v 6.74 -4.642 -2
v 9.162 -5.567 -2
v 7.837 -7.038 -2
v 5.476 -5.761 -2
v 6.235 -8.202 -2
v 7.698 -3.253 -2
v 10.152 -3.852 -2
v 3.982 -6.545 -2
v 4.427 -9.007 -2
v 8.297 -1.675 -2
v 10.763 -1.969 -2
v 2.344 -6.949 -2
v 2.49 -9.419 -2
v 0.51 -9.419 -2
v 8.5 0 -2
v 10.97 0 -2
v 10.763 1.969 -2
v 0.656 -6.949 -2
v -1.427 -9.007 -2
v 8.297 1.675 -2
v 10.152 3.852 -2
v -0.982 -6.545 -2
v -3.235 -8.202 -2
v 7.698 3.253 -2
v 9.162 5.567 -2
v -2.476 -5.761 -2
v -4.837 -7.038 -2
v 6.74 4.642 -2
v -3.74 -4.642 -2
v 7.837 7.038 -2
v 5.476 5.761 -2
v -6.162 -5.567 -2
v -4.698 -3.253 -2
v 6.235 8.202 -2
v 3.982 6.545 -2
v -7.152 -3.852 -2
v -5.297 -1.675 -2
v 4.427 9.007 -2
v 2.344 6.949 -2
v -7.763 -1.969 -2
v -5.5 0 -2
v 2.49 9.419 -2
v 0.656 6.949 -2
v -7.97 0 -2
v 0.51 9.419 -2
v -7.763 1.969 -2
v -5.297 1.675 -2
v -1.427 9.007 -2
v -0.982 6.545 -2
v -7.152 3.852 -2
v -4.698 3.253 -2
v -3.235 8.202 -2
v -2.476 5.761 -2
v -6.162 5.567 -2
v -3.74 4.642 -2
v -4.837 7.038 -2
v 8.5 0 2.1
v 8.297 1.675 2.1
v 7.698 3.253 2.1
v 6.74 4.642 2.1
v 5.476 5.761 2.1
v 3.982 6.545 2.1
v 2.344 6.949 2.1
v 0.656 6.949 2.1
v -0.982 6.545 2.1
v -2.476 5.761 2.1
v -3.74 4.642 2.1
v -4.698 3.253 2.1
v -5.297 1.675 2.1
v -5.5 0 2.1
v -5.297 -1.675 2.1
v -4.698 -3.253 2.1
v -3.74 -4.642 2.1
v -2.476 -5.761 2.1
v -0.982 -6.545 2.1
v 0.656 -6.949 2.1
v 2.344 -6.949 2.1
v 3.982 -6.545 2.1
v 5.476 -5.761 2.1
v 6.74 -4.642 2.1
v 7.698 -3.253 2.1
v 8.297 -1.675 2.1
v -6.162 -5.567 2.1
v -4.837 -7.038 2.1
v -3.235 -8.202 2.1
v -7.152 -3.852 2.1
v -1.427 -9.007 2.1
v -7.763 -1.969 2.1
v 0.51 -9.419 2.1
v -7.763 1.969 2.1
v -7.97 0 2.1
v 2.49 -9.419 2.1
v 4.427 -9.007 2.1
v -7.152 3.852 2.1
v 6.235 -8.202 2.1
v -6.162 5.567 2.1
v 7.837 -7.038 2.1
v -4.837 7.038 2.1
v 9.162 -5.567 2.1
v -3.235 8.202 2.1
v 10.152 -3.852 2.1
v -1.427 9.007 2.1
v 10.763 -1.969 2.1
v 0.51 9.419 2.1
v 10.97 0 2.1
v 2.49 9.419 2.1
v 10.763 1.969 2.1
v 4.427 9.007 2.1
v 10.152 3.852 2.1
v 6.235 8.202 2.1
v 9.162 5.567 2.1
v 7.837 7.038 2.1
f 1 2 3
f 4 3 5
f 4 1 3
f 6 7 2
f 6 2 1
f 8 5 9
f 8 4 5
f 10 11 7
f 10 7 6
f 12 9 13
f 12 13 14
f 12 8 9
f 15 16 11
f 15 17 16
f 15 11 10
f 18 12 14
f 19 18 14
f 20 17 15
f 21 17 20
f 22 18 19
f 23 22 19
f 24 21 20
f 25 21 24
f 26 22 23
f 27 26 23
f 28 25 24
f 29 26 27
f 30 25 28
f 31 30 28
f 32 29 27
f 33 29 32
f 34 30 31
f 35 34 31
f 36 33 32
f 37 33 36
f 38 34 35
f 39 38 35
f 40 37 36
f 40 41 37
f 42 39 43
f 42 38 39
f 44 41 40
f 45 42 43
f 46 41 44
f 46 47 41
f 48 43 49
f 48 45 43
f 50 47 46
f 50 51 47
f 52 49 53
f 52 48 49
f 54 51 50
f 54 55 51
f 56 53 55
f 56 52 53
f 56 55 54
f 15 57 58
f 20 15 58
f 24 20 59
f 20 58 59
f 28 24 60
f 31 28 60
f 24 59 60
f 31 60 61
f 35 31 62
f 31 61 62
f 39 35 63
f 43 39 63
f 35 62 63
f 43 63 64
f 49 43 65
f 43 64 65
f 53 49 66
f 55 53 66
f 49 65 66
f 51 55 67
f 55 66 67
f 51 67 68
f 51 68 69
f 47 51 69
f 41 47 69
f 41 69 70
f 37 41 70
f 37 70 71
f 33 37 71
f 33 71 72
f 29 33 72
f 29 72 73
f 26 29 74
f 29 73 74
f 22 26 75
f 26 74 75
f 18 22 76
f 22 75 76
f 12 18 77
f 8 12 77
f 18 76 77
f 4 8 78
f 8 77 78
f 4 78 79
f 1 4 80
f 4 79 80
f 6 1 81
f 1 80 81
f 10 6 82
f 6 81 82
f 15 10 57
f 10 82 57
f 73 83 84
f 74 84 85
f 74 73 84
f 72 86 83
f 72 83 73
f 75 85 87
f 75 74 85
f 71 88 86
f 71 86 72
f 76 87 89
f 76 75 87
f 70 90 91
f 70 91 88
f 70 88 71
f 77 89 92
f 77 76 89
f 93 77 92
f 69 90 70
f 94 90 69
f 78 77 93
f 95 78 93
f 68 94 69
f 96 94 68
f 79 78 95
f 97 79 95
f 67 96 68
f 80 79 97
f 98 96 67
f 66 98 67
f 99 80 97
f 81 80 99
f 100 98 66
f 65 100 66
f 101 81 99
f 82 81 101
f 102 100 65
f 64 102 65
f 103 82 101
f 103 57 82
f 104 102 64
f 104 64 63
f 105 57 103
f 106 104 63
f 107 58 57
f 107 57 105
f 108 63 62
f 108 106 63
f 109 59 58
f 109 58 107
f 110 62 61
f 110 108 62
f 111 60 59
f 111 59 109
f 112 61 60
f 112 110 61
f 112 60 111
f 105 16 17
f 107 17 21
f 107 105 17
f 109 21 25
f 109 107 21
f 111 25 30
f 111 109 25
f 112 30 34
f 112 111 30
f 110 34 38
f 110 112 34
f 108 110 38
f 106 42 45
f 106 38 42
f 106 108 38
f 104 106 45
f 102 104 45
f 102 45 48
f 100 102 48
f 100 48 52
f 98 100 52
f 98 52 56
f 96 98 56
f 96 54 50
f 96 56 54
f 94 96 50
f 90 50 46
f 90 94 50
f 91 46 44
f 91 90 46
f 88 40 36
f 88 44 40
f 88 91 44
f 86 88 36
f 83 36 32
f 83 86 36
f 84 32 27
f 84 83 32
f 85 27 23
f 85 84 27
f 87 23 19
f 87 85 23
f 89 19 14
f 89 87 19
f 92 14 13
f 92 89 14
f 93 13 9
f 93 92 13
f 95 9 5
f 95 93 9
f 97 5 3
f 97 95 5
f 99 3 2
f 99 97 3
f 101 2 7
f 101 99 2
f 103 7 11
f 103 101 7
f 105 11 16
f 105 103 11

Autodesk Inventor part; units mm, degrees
ref_plane "YZ Plane" through (0, 0, 0) normal (1, 0, 0) x (0, 1, 0)
ref_plane "XZ Plane" through (0, 0, 0) normal (0, 1, 0) x (-1, 0, 0)
ref_plane "XY Plane" through (0, 0, 0) normal (0, 0, 1) x (1, 0, 0)
sketch "Sketch1" plane through (0, 0, 0) normal (0, 0, 1) x (1, 0, 0)
  circle A0 centre (1.5, 0) radius 7 projected
  circle A1 centre (1.5, 0) radius 7 projected
  circle A2 centre (1.5, 0) radius 1.5 projected
  circle A3 centre (1.5, 0) radius 1 projected
  line L0 (16.2929, 8.3594) -> (-3.7046, 8.2678)
  line L1 (1.5, 0) -> (1.462, 8.2914)
  line L2 (1.462, 8.2914) -> (1.4574, 9.2914)
  line L3 (-7.6528, 0.7576) -> (-7.6612, 1.3735) projected
  ellipse E0 centre (-7.4913, -0.0469) end of major axis (-7.487, -1.0469) minor radius 0.015 projected
  ellipse E1 centre (-7.4913, -0.0469) end of major axis (-7.487, -1.0469) minor radius 0.015 projected
  ellipse E2 centre (-7.5641, 0.5606) end of major axis (-7.5648, 0.7606) minor radius 0.0029 (-7.5669, 0.6786) -> (-7.5649, 0.3868) ccw projected
  ellipse E3 centre (-7.607, -0.1095) end of major axis (-7.6033, -1.1095) minor radius 0.0145 projected
  ellipse E4 centre (-7.607, -0.1095) end of major axis (-7.6033, -1.1095) minor radius 0.0145 projected
  ellipse E5 centre (-7.4913, -0.0469) end of major axis (-7.487, -1.0469) minor radius 0.015 projected
  ellipse E6 centre (-7.4369, -0.2282) end of major axis (-7.4378, -0.0282) minor radius 0.003 (-7.4348, -0.4079) -> (-7.4361, -0.0582) ccw projected
  ellipse E7 centre (-7.4913, -0.0469) end of major axis (-7.487, -1.0469) minor radius 0.015 projected
  ellipse E8 centre (-7.4913, -0.0469) end of major axis (-7.487, -1.0469) minor radius 0.015 projected
  ellipse E9 centre (-7.5547, -1.7062) end of major axis (-7.5554, -1.5062) minor radius 0.0029 (-7.5538, -1.906) -> (-7.5527, -1.5926) ccw projected
  ellipse E10 centre (-7.6485, -1.6199) end of major axis (-7.6492, -1.4199) minor radius 0.0029 (-7.6512, -1.502) -> (-7.6479, -1.8195) ccw projected
  line L4 (-7.6369, -1.8711) -> (-7.6479, -1.8195) projected
  ellipse E11 centre (-7.6364, -2.0707) end of major axis (-7.6371, -1.8707) minor radius 0.0029 (-7.6334, -2.1069) -> (-7.6369, -1.8711) ccw projected
  line L5 (-7.6327, -2.8428) -> (-7.6334, -2.1069) projected
  ellipse E12 centre (-7.6297, -2.879) end of major axis (-7.6304, -2.679) minor radius 0.0029 (-7.6327, -2.8428) -> (-7.6279, -3.0648) ccw projected
  line L6 (-7.6189, -2.7874) -> (-7.6279, -3.0648) projected
  ellipse E13 centre (-7.6171, -2.9732) end of major axis (-7.6179, -2.7732) minor radius 0.0029 (-7.6145, -2.9205) -> (-7.6189, -2.7874) ccw projected
  line L7 (-7.609, -3.6423) -> (-7.6145, -2.9205) projected
  ellipse E14 centre (-7.6064, -3.5896) end of major axis (-7.6072, -3.3896) minor radius 0.0029 (-7.609, -3.6423) -> (-7.6038, -3.7248) ccw projected
  line L8 (-7.5985, -3.1734) -> (-7.6038, -3.7248) projected
  ellipse E15 centre (-7.5958, -3.3085) end of major axis (-7.5966, -3.1086) minor radius 0.0029 (-7.5941, -3.1773) -> (-7.5985, -3.1734) ccw projected
  line L9 (-7.585, -3.7421) -> (-7.5941, -3.1773) projected
  ellipse E16 centre (-7.5833, -3.6109) end of major axis (-7.584, -3.4109) minor radius 0.0029 (-7.585, -3.7421) -> (-7.5803, -3.6688) ccw projected
  line L10 (-7.5798, -2.9524) -> (-7.5803, -3.6688) projected
  ellipse E17 centre (-7.5768, -3.0103) end of major axis (-7.5775, -2.8103) minor radius 0.0029 (-7.5763, -2.8266) -> (-7.5798, -2.9524) ccw projected
  line L11 (-7.5652, -3.1224) -> (-7.5763, -2.8266) projected
  ellipse E18 centre (-7.5648, -2.9387) end of major axis (-7.5655, -2.7387) minor radius 0.0029 (-7.5652, -3.1224) -> (-7.562, -2.9078) ccw projected
  line L12 (-7.5664, -2.1685) -> (-7.562, -2.9078) projected
  ellipse E19 centre (-7.5637, -2.1375) end of major axis (-7.5644, -1.9375) minor radius 0.0029 (-7.5645, -1.9377) -> (-7.5664, -2.1685) ccw projected
  line L13 (-7.5538, -1.906) -> (-7.5645, -1.9377) projected
  ellipse E20 centre (-7.5547, -1.7062) end of major axis (-7.5554, -1.5062) minor radius 0.0029 (-7.5538, -1.906) -> (-7.5527, -1.5926) ccw projected
  line L14 (-7.5611, -0.9767) -> (-7.5527, -1.5926) projected
  ellipse E21 centre (-7.5591, -0.8631) end of major axis (-7.5599, -0.6631) minor radius 0.0029 (-7.5612, -0.6867) -> (-7.5611, -0.9767) ccw projected
  line L15 (-7.5529, -0.3338) -> (-7.5612, -0.6867) projected
  ellipse E22 centre (-7.5549, -0.1574) end of major axis (-7.5556, 0.0426) minor radius 0.0029 (-7.5529, -0.3338) -> (-7.5541, 0.0164) ccw projected
  line L16 (-7.5649, 0.3868) -> (-7.5541, 0.0164) projected
  ellipse E23 centre (-7.5641, 0.5606) end of major axis (-7.5648, 0.7606) minor radius 0.0029 (-7.5669, 0.6786) -> (-7.5649, 0.3868) ccw projected
  line L17 (-7.5627, 1.2829) -> (-7.5669, 0.6786) projected
  ellipse E24 centre (-7.5655, 1.4008) end of major axis (-7.5662, 1.6008) minor radius 0.0029 (-7.5627, 1.2829) -> (-7.566, 1.6004) ccw projected
  line L18 (-7.577, 1.652) -> (-7.566, 1.6004) projected
  ellipse E25 centre (-7.5775, 1.8516) end of major axis (-7.5783, 2.0516) minor radius 0.0029 (-7.5805, 1.8878) -> (-7.577, 1.652) ccw projected
  line L19 (-7.5812, 2.6237) -> (-7.5805, 1.8878) projected
  ellipse E26 centre (-7.5842, 2.66) end of major axis (-7.585, 2.86) minor radius 0.0029 (-7.5812, 2.6237) -> (-7.586, 2.8457) ccw projected
  line L20 (-7.595, 2.5683) -> (-7.586, 2.8457) projected
  ellipse E27 centre (-7.5968, 2.7541) end of major axis (-7.5975, 2.9541) minor radius 0.0029 (-7.5994, 2.7014) -> (-7.595, 2.5683) ccw projected
  line L21 (-7.6049, 3.4233) -> (-7.5994, 2.7014) projected
  ellipse E28 centre (-7.6075, 3.3705) end of major axis (-7.6082, 3.5705) minor radius 0.0029 (-7.6049, 3.4233) -> (-7.6101, 3.5057) ccw projected
  line L22 (-7.6154, 2.9543) -> (-7.6101, 3.5057) projected
  ellipse E29 centre (-7.6181, 3.0895) end of major axis (-7.6188, 3.2895) minor radius 0.0029 (-7.6198, 2.9582) -> (-7.6154, 2.9543) ccw projected
  line L23 (-7.629, 3.523) -> (-7.6198, 2.9582) projected
  ellipse E30 centre (-7.6307, 3.3918) end of major axis (-7.6314, 3.5918) minor radius 0.0029 (-7.629, 3.523) -> (-7.6337, 3.4497) ccw projected
  line L24 (-7.6342, 2.7334) -> (-7.6337, 3.4497) projected
  ellipse E31 centre (-7.6372, 2.7912) end of major axis (-7.6379, 2.9912) minor radius 0.0029 (-7.6376, 2.6075) -> (-7.6342, 2.7334) ccw projected
  line L25 (-7.6487, 2.9034) -> (-7.6376, 2.6075) projected
  ellipse E32 centre (-7.6492, 2.7196) end of major axis (-7.6499, 2.9196) minor radius 0.0029 (-7.6487, 2.9034) -> (-7.6519, 2.6887) ccw projected
  line L26 (-7.6475, 1.9494) -> (-7.6519, 2.6887) projected
  ellipse E33 centre (-7.6503, 1.9184) end of major axis (-7.651, 2.1184) minor radius 0.0029 (-7.6494, 1.7186) -> (-7.6475, 1.9494) ccw projected
  line L27 (-7.6601, 1.6869) -> (-7.6494, 1.7186) projected
  ellipse E34 centre (-7.6593, 1.4871) end of major axis (-7.66, 1.6871) minor radius 0.0029 (-7.6601, 1.6869) -> (-7.6612, 1.3735) ccw projected
  line L28 (-7.6528, 0.7576) -> (-7.6612, 1.3735) projected
  ellipse E35 centre (-7.6548, 0.644) end of major axis (-7.6555, 0.844) minor radius 0.0029 (-7.6528, 0.4676) -> (-7.6528, 0.7576) ccw projected
  line L29 (-7.661, 0.1147) -> (-7.6528, 0.4676) projected
  ellipse E36 centre (-7.659, -0.0617) end of major axis (-7.6598, 0.1383) minor radius 0.0029 (-7.661, 0.1147) -> (-7.6598, -0.2354) ccw projected
  line L30 (-7.649, -0.6059) -> (-7.6598, -0.2354) projected
  ellipse E37 centre (-7.6498, -0.7797) end of major axis (-7.6506, -0.5797) minor radius 0.0029 (-7.6471, -0.8977) -> (-7.649, -0.6059) ccw projected
  line L31 (-7.6512, -1.502) -> (-7.6471, -0.8977) projected
  ellipse E38 centre (-7.6485, -1.6199) end of major axis (-7.6492, -1.4199) minor radius 0.0029 (-7.6512, -1.502) -> (-7.6479, -1.8195) ccw projected
  ellipse E39 centre (-7.6485, -1.6199) end of major axis (-7.6492, -1.4199) minor radius 0.0029 (-7.6512, -1.502) -> (-7.6479, -1.8195) ccw projected
  line L32 (-7.5611, -0.9767) -> (-7.5527, -1.5926) projected
  line L33 (-7.5611, -0.9767) -> (-7.5527, -1.5926) projected
  line L34 (-7.5611, -0.9767) -> (-7.5527, -1.5926) projected
  line L35 (-7.5611, -0.9767) -> (-7.5527, -1.5926) projected
  ellipse E40 centre (-7.6498, -0.7797) end of major axis (-7.6506, -0.5797) minor radius 0.0029 (-7.6471, -0.8977) -> (-7.649, -0.6059) ccw projected
  ellipse E41 centre (-7.607, -0.1095) end of major axis (-7.6033, -1.1095) minor radius 0.0145 projected
  line L36 (-7.661, 0.1147) -> (-7.6528, 0.4676) projected
  ellipse E42 centre (-7.5655, 1.4008) end of major axis (-7.5662, 1.6008) minor radius 0.0029 (-7.5627, 1.2829) -> (-7.566, 1.6004) ccw projected
  line L37 (-7.5335, 2.0955) -> (-7.538, 2.8386) projected
  line L38 (-7.5812, 2.6237) -> (-7.5805, 1.8878) projected
  line L39 (-7.5335, 2.0955) -> (-7.538, 2.8386) projected
  ellipse E43 centre (-7.5363, 2.072) end of major axis (-7.5372, 2.272) minor radius 0.003 (-7.5355, 1.872) -> (-7.5335, 2.0955) ccw projected
  line L40 (-7.5467, 1.8682) -> (-7.5355, 1.872) projected
  ellipse E44 centre (-7.5458, 1.6682) end of major axis (-7.5466, 1.8682) minor radius 0.003 (-7.5467, 1.8682) -> (-7.5478, 1.5608) ccw projected
  line L41 (-7.5391, 0.9295) -> (-7.5478, 1.5608) projected
  ellipse E45 centre (-7.5412, 0.8221) end of major axis (-7.542, 1.0221) minor radius 0.003 (-7.5391, 0.6423) -> (-7.5391, 0.9295) ccw projected
  line L42 (-7.5477, 0.3142) -> (-7.5391, 0.6423) projected
  ellipse E46 centre (-7.5456, 0.1345) end of major axis (-7.5465, 0.3345) minor radius 0.003 (-7.5477, 0.3142) -> (-7.5465, -0.0355) ccw projected
  line L43 (-7.5352, -0.43) -> (-7.5465, -0.0355) projected
  ellipse E47 centre (-7.5361, -0.5999) end of major axis (-7.5369, -0.3999) minor radius 0.003 (-7.5332, -0.7238) -> (-7.5352, -0.43) ccw projected
  line L44 (-7.5376, -1.3113) -> (-7.5332, -0.7238) projected
  ellipse E48 centre (-7.5347, -1.4352) end of major axis (-7.5356, -1.2352) minor radius 0.003 (-7.5376, -1.3113) -> (-7.5342, -1.634) ccw projected
  line L45 (-7.5227, -1.7135) -> (-7.5342, -1.634) projected
  ellipse E49 centre (-7.5221, -1.9124) end of major axis (-7.523, -1.7124) minor radius 0.003 (-7.519, -1.9559) -> (-7.5227, -1.7135) ccw projected
  line L46 (-7.5183, -2.6863) -> (-7.519, -1.9559) projected
  ellipse E50 centre (-7.5152, -2.7298) end of major axis (-7.5161, -2.5298) minor radius 0.003 (-7.5183, -2.6863) -> (-7.5134, -2.9182) ccw projected
  line L47 (-7.5039, -2.6669) -> (-7.5134, -2.9182) projected
  ellipse E51 centre (-7.5021, -2.8553) end of major axis (-7.5029, -2.6553) minor radius 0.003 (-7.4994, -2.8098) -> (-7.5039, -2.6669) ccw projected
  line L48 (-7.4937, -3.5386) -> (-7.4994, -2.8098) projected
  ellipse E52 centre (-7.4909, -3.4931) end of major axis (-7.4918, -3.2931) minor radius 0.003 (-7.4937, -3.5386) -> (-7.4882, -3.6337) ccw projected
  line L49 (-7.4826, -3.1014) -> (-7.4882, -3.6337) projected
  ellipse E53 centre (-7.4799, -3.242) end of major axis (-7.4808, -3.042) minor radius 0.003 (-7.4781, -3.1166) -> (-7.4826, -3.1014) ccw projected
  line L50 (-7.4685, -3.6993) -> (-7.4781, -3.1166) projected
  ellipse E54 centre (-7.4668, -3.5738) end of major axis (-7.4676, -3.3738) minor radius 0.003 (-7.4685, -3.6993) -> (-7.4636, -3.6387) ccw projected
  line L51 (-7.4631, -2.9309) -> (-7.4636, -3.6387) projected
  ellipse E55 centre (-7.4599, -2.9959) end of major axis (-7.4608, -2.7959) minor radius 0.003 (-7.4594, -2.8153) -> (-7.4631, -2.9309) ccw projected
  line L52 (-7.4479, -3.1365) -> (-7.4594, -2.8153) projected
  ellipse E56 centre (-7.4474, -2.9559) end of major axis (-7.4483, -2.7559) minor radius 0.003 (-7.4479, -3.1365) -> (-7.4446, -2.9324) ccw projected
  line L53 (-7.4491, -2.1892) -> (-7.4446, -2.9324) projected
  ellipse E57 centre (-7.4462, -2.1657) end of major axis (-7.4471, -1.9657) minor radius 0.003 (-7.4471, -1.9657) -> (-7.4491, -2.1892) ccw projected
  line L54 (-7.4359, -1.9619) -> (-7.4471, -1.9657) projected
  ellipse E58 centre (-7.4368, -1.7619) end of major axis (-7.4376, -1.5619) minor radius 0.003 (-7.4359, -1.9619) -> (-7.4347, -1.6545) ccw projected
  line L55 (-7.4435, -1.0232) -> (-7.4347, -1.6545) projected
  ellipse E59 centre (-7.4414, -0.9158) end of major axis (-7.4423, -0.7158) minor radius 0.003 (-7.4435, -0.736) -> (-7.4435, -1.0232) ccw projected
  line L56 (-7.4348, -0.4079) -> (-7.4435, -0.736) projected
  ellipse E60 centre (-7.4369, -0.2282) end of major axis (-7.4378, -0.0282) minor radius 0.003 (-7.4348, -0.4079) -> (-7.4361, -0.0582) ccw projected
  line L57 (-7.4473, 0.3362) -> (-7.4361, -0.0582) projected
  ellipse E61 centre (-7.4465, 0.5062) end of major axis (-7.4473, 0.7062) minor radius 0.003 (-7.4494, 0.6301) -> (-7.4473, 0.3362) ccw projected
  line L58 (-7.445, 1.2175) -> (-7.4494, 0.6301) projected
  ellipse E62 centre (-7.4478, 1.3414) end of major axis (-7.4487, 1.5414) minor radius 0.003 (-7.445, 1.2175) -> (-7.4484, 1.5403) ccw projected
  line L59 (-7.4599, 1.6198) -> (-7.4484, 1.5403) projected
  ellipse E63 centre (-7.4604, 1.8186) end of major axis (-7.4613, 2.0186) minor radius 0.003 (-7.4635, 1.8622) -> (-7.4599, 1.6198) ccw projected
  line L60 (-7.4642, 2.5926) -> (-7.4635, 1.8622) projected
  ellipse E64 centre (-7.4674, 2.6361) end of major axis (-7.4682, 2.8361) minor radius 0.003 (-7.4642, 2.5926) -> (-7.4692, 2.8245) ccw projected
  line L61 (-7.4787, 2.5732) -> (-7.4692, 2.8245) projected
  ellipse E65 centre (-7.4805, 2.7616) end of major axis (-7.4813, 2.9616) minor radius 0.003 (-7.4832, 2.7161) -> (-7.4787, 2.5732) ccw projected
  line L62 (-7.4889, 3.4448) -> (-7.4832, 2.7161) projected
  ellipse E66 centre (-7.4916, 3.3993) end of major axis (-7.4925, 3.5993) minor radius 0.003 (-7.4889, 3.4448) -> (-7.4944, 3.5399) ccw projected
  line L63 (-7.4999, 3.0077) -> (-7.4944, 3.5399) projected
  ellipse E67 centre (-7.5027, 3.1483) end of major axis (-7.5035, 3.3483) minor radius 0.003 (-7.5045, 3.0228) -> (-7.4999, 3.0077) ccw projected
  line L64 (-7.514, 3.6055) -> (-7.5045, 3.0228) projected
  ellipse E68 centre (-7.5158, 3.48) end of major axis (-7.5167, 3.68) minor radius 0.003 (-7.514, 3.6055) -> (-7.5189, 3.545) ccw projected
  line L65 (-7.5195, 2.8372) -> (-7.5189, 3.545) projected
  ellipse E69 centre (-7.5226, 2.9022) end of major axis (-7.5235, 3.1022) minor radius 0.003 (-7.5231, 2.7216) -> (-7.5195, 2.8372) ccw projected
  line L66 (-7.5346, 3.0428) -> (-7.5231, 2.7216) projected
  ellipse E70 centre (-7.5351, 2.8622) end of major axis (-7.536, 3.0622) minor radius 0.003 (-7.5346, 3.0428) -> (-7.538, 2.8386) ccw projected
  line L67 (-5.5, -0.0031) -> (-7.664, -0.0125)
  circle A4 centre (1.5, 0) radius 9.164
  point P0 (0, 0)
  dimension "d0" = 1
extrude "Extrusion1" add sketch "Sketch1" along normal blind 2.5 contours A0 | L67 L57 E61 L58 E62 L59 E63 L60 A4 L0 L1 A0 | A0 L1 L0 A4 E57 L54 E58 L55 E59 L56 E6 L57 L67 | L67 E0 E46 L42 E45 L41 A4 L60 E63 L59 E62 L58 E61 L57 | L57 E6 L56 E59 L55 E58 L54 E57 A4 E3 L67 E0 | L2 A4 L0 | L0 A4 L2 | L67 E0 | E0 L67 | A4 L29 E36 | L67 E22 L16 E2 L17 E24 A4 L41 E45 L42 E46 | L67 E3 E36 L29 A4 E24 L17 E2 L16 E22 | L67 E3 | E3 A4 L67 | E3 A4 E36 L67 | A2 | A3
sketch "Sketch2" plane through (1.5, 0, 0) normal (0, 0, -1) x (-1, 0, 0)
  circle A0 centre (0, 0) radius 9.164 projected
  circle A1 centre (0, 0) radius 7 projected
  point P0 (1.5, 0)
extrude "Extrusion2" add sketch "Sketch2" along normal blind 2
sketch "Sketch3" plane through (1.5, 0, 2.5) normal (0, 0, 1) x (1, 0, 0)
  circle A0 centre (0, 0) radius 7 projected
  point P0 (-1.5, 0)
extrude "Extrusion3" cut sketch "Sketch3" against normal through all
sketch "Sketch4" plane through (1.5, 0, 2.5) normal (0, 0, 1) x (1, 0, 0)
  circle A0 centre (0, 0) radius 7 projected
  circle A1 centre (0, 0) radius 9.164 projected
  point P0 (-1.5, 0)
extrude "Extrusion4" cut sketch "Sketch4" against normal blind 0.4
sketch "Sketch5" plane through (1.5, 0, 2.1) normal (0, 0, 1) x (1, 0, 0)
  circle A0 centre (0, 0) radius 9.164 projected
  line L0 (-13.1755, -10.8308) -> (6.6487, -8.1853)
  line L1 (0, 0) -> (1.1895, -8.9138)
  line L2 (1.1895, -8.9138) -> (1.1895, -9.6873)
  line L3 (1.1895, -8.9138) -> (1.2928, -9.6873)
  circle A1 centre (0, 0) radius 9.4704
  point P0 (-1.5, 0)
extrude "Extrusion5" add sketch "Sketch5" against normal up to surface (4.1 mm away) contours A0 L0 A1 | A0 L2 A1 L0 | L0 A1 L3 A0 | A0 L3 A1 L2
properties part number "kokool"
